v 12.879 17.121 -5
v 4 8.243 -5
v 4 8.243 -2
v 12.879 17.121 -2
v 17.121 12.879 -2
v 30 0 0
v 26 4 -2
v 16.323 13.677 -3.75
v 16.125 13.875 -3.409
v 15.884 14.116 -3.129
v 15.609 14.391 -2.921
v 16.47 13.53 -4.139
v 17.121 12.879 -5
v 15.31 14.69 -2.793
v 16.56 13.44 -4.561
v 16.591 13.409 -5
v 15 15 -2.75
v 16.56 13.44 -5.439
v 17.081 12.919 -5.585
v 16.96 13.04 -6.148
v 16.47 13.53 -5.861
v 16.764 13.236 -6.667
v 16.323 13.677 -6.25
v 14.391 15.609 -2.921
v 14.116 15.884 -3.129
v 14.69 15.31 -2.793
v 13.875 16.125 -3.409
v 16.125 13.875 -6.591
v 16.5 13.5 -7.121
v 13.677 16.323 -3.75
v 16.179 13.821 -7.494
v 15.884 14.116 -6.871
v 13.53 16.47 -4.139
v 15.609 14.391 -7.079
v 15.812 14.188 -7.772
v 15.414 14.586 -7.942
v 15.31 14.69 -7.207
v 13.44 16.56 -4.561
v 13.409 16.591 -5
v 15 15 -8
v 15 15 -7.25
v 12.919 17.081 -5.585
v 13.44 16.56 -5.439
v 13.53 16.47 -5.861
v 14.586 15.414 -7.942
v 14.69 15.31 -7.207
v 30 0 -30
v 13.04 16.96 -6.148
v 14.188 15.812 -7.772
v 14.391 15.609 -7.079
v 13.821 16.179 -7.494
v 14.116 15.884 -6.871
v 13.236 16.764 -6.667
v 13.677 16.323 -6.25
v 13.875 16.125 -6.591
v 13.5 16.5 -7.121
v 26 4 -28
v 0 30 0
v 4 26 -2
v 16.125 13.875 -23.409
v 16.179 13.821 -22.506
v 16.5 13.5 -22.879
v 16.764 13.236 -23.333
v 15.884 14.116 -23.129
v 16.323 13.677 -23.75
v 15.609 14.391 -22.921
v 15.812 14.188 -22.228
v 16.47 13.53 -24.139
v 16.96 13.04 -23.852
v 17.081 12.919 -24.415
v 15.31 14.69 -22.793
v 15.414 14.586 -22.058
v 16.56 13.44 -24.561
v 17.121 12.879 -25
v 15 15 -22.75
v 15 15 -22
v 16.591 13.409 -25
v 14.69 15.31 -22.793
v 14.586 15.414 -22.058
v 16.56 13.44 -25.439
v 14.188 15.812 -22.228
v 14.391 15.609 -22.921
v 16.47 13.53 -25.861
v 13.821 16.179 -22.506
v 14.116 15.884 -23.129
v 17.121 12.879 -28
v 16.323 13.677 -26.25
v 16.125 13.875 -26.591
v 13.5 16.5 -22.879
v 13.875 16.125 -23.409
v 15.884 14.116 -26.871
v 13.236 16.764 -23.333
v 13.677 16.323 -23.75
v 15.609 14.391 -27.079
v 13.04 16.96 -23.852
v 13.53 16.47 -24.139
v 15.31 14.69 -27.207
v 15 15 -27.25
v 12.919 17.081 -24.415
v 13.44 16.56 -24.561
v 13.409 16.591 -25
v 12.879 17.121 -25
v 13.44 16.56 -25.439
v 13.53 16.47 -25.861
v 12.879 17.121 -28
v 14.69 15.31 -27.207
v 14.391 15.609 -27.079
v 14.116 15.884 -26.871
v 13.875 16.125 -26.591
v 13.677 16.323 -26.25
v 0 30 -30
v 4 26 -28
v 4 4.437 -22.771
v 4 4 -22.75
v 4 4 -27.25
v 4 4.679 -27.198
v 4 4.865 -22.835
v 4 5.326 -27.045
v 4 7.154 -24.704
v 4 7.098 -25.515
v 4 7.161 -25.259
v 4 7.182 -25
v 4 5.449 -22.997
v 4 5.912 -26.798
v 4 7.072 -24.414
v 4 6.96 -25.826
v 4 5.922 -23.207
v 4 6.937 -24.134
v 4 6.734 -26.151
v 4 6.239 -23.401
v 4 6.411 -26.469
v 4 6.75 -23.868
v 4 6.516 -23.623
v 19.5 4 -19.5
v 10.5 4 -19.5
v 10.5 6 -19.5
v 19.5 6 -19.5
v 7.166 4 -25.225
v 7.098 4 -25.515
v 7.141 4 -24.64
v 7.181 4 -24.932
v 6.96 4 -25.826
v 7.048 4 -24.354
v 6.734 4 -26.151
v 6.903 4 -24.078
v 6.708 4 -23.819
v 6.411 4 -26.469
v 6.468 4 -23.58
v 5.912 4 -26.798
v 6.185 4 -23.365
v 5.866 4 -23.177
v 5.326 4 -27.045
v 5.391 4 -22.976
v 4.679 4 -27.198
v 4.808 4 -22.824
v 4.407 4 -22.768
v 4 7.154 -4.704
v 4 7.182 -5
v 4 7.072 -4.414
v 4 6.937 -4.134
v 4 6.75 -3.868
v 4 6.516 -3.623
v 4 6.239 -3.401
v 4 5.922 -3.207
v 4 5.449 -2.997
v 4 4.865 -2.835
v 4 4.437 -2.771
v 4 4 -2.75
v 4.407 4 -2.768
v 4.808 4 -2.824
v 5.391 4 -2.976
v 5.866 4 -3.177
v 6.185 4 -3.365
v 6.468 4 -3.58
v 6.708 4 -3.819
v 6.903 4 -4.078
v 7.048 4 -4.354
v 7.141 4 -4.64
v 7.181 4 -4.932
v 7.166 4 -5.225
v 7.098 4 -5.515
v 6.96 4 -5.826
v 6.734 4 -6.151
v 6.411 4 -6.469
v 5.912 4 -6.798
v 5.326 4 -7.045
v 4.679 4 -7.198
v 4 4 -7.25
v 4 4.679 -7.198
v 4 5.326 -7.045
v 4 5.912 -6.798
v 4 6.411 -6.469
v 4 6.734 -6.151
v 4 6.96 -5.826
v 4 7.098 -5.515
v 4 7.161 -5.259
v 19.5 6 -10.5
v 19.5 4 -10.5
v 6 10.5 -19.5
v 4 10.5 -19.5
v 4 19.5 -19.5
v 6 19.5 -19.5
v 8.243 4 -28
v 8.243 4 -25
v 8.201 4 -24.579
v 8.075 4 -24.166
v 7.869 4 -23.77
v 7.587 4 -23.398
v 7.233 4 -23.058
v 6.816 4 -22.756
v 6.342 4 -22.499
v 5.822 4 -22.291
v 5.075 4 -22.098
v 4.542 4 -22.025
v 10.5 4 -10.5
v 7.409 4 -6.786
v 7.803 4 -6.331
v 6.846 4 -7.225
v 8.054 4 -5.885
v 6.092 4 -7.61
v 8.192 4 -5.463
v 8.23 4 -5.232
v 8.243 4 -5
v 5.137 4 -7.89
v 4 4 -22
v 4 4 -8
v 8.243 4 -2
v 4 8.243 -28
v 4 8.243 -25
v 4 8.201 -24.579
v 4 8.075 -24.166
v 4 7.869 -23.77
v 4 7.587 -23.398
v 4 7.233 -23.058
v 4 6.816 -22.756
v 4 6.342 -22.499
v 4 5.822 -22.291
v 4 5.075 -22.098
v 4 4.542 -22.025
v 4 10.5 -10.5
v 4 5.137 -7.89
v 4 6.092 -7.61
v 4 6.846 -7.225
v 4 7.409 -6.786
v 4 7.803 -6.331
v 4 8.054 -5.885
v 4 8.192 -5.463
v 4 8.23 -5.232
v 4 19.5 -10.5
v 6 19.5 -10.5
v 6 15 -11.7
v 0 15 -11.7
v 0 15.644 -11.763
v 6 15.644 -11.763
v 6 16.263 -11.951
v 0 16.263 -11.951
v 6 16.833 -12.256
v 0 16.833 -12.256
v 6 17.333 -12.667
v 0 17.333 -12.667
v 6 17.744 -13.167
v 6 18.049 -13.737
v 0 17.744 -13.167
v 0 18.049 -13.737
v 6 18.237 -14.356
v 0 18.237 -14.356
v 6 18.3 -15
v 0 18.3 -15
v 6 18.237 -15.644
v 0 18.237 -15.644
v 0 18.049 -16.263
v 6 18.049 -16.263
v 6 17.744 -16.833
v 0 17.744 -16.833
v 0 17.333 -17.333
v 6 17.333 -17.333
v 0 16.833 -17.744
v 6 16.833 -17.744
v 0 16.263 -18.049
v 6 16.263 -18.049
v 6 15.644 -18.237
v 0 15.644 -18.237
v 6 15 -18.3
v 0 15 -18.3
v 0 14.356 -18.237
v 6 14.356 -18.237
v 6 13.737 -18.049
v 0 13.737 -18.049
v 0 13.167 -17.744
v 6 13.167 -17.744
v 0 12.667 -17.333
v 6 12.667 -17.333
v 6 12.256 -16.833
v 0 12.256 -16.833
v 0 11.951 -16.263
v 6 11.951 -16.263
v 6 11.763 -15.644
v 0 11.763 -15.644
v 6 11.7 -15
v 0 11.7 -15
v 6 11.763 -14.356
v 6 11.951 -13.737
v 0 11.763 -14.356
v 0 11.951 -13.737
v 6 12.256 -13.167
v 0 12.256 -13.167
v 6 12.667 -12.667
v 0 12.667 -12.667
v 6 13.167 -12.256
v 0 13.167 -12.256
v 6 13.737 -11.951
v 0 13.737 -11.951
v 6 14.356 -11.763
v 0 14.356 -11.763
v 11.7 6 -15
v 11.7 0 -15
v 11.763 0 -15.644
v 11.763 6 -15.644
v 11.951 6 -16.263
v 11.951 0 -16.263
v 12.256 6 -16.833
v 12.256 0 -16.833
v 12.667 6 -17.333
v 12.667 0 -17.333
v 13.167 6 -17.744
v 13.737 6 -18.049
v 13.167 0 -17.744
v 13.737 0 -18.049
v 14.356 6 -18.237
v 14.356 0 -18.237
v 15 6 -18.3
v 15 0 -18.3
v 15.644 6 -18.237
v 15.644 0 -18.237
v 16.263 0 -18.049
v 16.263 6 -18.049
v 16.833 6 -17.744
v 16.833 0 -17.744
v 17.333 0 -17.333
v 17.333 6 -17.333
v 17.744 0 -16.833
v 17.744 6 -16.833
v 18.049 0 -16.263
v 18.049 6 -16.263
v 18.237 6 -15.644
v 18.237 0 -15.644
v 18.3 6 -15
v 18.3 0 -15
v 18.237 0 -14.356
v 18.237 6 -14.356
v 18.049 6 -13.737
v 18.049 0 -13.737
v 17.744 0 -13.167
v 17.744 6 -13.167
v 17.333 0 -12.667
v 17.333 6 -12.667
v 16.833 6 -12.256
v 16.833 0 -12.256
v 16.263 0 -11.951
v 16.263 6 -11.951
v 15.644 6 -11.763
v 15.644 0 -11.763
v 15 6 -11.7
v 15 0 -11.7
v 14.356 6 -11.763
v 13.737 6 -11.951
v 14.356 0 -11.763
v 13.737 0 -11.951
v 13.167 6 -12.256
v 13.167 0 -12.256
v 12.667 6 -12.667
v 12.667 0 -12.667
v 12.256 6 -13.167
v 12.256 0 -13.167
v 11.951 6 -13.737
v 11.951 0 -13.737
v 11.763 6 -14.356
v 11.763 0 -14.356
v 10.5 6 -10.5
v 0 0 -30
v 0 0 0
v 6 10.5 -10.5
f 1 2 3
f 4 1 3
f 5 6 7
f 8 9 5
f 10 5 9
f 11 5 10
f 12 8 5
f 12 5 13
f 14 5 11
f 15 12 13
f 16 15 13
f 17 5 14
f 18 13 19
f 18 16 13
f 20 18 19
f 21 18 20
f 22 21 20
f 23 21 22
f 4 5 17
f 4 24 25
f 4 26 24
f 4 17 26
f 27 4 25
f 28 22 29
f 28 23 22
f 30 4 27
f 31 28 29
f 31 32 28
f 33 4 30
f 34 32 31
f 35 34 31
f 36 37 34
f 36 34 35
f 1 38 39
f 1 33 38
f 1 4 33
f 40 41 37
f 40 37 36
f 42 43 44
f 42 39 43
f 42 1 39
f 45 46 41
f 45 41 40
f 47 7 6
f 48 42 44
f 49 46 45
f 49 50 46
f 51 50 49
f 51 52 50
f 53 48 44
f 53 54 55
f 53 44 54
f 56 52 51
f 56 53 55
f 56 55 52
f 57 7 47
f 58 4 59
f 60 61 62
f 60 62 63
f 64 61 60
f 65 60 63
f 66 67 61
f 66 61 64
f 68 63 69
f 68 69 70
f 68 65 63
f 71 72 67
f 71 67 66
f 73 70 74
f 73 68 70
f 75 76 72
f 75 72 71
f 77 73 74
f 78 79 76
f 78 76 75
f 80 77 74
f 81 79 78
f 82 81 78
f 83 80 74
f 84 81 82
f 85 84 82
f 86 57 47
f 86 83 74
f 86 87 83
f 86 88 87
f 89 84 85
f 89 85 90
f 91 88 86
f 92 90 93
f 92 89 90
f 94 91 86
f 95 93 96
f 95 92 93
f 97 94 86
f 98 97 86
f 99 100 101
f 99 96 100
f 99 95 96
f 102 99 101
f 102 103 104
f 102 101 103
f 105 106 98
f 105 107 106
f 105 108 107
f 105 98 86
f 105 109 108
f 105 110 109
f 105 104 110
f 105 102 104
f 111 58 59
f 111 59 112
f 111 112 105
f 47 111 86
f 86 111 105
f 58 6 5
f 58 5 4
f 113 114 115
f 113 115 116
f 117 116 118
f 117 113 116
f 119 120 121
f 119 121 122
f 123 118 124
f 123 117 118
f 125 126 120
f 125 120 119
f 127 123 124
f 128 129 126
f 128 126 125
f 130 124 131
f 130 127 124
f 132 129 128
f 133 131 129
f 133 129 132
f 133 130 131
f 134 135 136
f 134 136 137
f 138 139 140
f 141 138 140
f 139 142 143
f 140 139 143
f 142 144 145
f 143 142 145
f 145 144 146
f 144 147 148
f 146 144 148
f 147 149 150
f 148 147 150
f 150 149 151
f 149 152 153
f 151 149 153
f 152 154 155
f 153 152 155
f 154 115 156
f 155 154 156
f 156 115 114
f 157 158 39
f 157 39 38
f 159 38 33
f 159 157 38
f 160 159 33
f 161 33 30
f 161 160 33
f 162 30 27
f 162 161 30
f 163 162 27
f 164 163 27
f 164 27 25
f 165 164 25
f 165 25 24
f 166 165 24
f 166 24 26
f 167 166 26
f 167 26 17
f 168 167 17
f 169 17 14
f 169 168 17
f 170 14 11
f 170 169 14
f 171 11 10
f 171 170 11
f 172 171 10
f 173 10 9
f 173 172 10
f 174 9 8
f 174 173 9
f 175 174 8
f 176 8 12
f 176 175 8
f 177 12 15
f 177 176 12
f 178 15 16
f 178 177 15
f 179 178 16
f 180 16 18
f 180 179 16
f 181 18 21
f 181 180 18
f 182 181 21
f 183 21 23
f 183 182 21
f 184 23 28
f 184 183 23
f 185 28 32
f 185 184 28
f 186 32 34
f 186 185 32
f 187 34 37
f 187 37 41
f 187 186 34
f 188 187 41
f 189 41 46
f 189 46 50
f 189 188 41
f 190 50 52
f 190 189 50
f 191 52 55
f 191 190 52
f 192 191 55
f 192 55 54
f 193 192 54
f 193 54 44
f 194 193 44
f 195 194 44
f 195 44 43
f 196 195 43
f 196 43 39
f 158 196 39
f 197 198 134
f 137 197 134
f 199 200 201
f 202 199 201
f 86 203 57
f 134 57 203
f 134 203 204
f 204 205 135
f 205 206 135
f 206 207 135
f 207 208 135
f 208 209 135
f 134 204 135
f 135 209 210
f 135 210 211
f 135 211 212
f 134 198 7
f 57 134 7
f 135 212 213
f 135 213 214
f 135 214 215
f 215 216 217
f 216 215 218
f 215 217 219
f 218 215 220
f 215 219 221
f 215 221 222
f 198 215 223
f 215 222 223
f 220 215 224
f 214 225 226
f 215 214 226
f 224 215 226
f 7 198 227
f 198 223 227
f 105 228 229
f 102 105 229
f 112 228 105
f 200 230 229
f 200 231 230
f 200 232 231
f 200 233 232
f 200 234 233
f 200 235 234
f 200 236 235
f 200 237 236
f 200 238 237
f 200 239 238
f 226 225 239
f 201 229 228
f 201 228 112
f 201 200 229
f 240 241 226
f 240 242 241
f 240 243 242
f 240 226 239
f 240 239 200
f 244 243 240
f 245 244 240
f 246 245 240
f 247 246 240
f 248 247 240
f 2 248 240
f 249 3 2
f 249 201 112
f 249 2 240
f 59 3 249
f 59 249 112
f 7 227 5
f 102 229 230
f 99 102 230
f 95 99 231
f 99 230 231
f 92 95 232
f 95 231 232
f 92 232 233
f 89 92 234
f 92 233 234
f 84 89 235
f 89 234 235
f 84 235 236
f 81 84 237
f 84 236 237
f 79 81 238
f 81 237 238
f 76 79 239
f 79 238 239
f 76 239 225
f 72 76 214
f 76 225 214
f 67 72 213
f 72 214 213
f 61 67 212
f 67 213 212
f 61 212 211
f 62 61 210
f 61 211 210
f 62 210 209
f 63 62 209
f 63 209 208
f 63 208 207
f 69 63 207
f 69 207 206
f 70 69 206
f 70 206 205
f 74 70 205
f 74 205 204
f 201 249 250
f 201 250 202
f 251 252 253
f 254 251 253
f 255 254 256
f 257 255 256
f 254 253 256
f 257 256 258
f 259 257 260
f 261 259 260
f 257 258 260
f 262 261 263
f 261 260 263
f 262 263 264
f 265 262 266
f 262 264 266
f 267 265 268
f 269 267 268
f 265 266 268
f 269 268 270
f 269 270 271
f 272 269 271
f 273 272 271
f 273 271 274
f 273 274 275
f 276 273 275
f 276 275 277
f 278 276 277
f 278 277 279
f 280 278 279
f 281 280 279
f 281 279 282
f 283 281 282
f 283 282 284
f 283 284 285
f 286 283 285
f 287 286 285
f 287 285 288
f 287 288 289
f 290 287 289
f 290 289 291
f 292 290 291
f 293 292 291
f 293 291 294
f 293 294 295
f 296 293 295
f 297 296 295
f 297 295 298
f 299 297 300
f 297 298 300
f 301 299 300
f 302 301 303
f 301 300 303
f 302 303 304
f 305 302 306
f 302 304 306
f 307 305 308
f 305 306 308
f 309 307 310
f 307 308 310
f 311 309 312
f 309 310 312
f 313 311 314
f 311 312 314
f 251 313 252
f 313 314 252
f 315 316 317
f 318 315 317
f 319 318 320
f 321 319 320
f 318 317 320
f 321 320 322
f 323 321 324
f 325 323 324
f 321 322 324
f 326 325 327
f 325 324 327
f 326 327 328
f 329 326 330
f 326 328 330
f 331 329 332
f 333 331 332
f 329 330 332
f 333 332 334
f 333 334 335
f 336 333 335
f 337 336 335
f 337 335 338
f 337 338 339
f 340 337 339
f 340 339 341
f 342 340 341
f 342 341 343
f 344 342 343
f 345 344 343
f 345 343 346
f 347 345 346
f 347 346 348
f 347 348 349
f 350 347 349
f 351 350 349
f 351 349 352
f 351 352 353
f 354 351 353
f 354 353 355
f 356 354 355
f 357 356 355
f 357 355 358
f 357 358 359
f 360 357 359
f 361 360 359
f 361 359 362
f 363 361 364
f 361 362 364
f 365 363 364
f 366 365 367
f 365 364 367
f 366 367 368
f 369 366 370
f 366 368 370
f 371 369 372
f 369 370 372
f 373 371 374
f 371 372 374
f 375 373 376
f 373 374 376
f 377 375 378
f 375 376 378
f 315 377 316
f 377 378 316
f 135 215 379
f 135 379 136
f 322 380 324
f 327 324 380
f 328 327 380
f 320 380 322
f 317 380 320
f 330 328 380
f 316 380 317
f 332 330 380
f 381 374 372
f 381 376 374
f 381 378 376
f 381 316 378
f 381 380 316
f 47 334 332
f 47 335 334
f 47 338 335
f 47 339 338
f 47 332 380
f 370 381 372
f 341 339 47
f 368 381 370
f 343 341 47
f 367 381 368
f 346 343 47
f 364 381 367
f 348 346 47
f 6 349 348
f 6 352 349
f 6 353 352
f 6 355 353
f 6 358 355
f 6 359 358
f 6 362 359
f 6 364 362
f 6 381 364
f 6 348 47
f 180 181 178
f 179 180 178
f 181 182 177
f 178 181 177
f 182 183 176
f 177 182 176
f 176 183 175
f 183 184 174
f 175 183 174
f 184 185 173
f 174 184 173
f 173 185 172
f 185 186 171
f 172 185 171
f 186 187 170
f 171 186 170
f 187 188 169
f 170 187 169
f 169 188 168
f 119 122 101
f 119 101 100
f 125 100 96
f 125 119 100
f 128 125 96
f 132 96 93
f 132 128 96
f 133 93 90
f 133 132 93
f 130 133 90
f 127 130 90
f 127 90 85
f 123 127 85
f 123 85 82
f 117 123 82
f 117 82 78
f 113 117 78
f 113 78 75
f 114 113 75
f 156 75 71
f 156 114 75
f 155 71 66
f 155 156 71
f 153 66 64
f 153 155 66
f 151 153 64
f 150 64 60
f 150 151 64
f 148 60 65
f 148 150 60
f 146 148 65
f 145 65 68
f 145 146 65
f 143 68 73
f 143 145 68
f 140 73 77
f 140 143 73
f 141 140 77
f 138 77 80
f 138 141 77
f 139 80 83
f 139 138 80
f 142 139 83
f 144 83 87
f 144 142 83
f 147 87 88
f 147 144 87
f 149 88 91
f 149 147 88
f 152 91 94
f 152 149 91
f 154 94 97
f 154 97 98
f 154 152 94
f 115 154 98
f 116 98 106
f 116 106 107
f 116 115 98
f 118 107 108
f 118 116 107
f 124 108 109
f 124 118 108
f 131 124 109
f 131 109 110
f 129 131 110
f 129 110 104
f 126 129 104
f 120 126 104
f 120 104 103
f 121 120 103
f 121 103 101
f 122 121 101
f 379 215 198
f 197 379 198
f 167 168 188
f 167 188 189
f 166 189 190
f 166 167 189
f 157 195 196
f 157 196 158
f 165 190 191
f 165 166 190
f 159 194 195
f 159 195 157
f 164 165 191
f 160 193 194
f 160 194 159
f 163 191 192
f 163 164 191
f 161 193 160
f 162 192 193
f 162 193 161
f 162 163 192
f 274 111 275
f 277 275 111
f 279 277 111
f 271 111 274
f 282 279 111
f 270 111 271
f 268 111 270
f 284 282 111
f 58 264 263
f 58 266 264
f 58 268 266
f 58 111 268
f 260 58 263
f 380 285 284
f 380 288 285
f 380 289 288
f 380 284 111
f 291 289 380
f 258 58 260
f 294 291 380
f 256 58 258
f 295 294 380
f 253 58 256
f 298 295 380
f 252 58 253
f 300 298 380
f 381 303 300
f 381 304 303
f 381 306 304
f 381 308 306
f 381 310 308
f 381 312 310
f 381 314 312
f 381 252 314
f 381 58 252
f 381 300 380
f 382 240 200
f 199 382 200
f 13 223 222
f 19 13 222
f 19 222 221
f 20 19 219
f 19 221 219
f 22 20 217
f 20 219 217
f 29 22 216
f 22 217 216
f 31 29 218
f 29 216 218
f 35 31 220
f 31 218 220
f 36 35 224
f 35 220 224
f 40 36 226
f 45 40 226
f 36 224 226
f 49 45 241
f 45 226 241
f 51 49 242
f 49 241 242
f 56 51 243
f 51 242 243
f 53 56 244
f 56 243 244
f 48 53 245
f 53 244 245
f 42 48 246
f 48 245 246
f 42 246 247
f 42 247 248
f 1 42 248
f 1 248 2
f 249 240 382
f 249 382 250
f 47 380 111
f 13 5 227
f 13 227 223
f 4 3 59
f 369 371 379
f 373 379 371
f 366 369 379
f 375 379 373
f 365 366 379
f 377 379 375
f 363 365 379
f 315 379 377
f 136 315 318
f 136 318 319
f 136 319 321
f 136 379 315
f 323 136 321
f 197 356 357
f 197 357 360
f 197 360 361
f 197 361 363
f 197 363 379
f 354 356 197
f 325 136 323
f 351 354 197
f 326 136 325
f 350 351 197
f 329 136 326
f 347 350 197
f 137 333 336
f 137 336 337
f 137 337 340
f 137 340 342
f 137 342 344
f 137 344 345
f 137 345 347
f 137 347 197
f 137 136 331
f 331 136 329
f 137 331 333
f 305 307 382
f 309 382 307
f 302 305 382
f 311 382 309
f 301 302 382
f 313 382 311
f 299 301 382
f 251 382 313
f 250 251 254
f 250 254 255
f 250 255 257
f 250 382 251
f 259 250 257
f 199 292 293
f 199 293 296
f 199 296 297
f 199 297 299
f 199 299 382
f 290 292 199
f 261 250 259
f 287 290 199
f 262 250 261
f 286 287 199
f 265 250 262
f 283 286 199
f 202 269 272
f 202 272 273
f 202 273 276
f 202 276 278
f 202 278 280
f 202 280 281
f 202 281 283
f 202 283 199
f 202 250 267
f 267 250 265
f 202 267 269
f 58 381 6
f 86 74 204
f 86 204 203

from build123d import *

# Parameters (mm, degrees)
BOSS_EXTRUDE1_DEPTH  = 30
SHELL1_START         = 4
SHELL1_OUTLINE_W     = 23
SHELL1_OUTLINE_H     = 26
SHELL1_DEPTH         = 22
SKETCH2_W            = 9
SKETCH2_H            = 9
BOSS_EXTRUDE2_DEPTH  = 2
SKETCH3_W            = 9
SKETCH3_H            = 9
BOSS_EXTRUDE3_DEPTH  = 2
BOSS_EXTRUDE4_START  = -15.556349
SKETCH4_R            = 2.25
BOSS_EXTRUDE4_DEPTH  = 15.556349
M6_CLEARANCE_HOLE2_D = 6.6
M6_CLEARANCE_HOLE3_D = 6.6


# Read off the part's stored shape, not the designer's step: Shell1
with BuildPart() as part:
    # Sketch1 → Boss-Extrude1 (new body)
    with BuildSketch(Plane.XY):
        Polygon((0, 0), (30, 0), (0, 30), align=None)
    extrude(amount=-BOSS_EXTRUDE1_DEPTH)

    # Shell1 outline → Shell1 (cut)
    with BuildSketch(Plane.YZ.offset(SHELL1_START)):
        with Locations((15.5, -15)):
            Rectangle(SHELL1_OUTLINE_W, SHELL1_OUTLINE_H)
    extrude(amount=SHELL1_DEPTH, mode=Mode.SUBTRACT)

    # Sketch2 → Boss-Extrude2 (add)
    with BuildSketch(Plane(origin=(0, 4, 0), x_dir=(1, 0, 0), z_dir=(0, 1, 0))):
        with Locations((15, 15)):
            Rectangle(SKETCH2_W, SKETCH2_H)
    extrude(amount=BOSS_EXTRUDE2_DEPTH)

    # Sketch3 → Boss-Extrude3 (add)
    with BuildSketch(Plane(origin=(4, 0, 0), x_dir=(0, 0, -1), z_dir=(1, 0, 0))):
        with Locations((15, 15)):
            Rectangle(SKETCH3_W, SKETCH3_H)
    extrude(amount=BOSS_EXTRUDE3_DEPTH)

    # Sketch4 → Boss-Extrude4 (add)
    # profile 1 of 2: a face of its own
    with BuildSketch(Plane(origin=(15, 15, 0), x_dir=(0, 0, -1), z_dir=(0.7071067811865477, 0.7071067811865475, 0)).offset(BOSS_EXTRUDE4_START)):
        with BuildLine():
            Line((2, 3), (2, -3))
            Line((2, -3), (5, -3))
            ThreePointArc((5, -3), (8, 0), (5, 3))
            Line((5, 3), (2, 3))
        make_face()
        with Locations(Location((5, 0, 0), (0, 0, 90))):
            Circle(SKETCH4_R, mode=Mode.SUBTRACT)
    # profile 2 of 2: a face of its own
    with BuildSketch(Plane(origin=(15, 15, 0), x_dir=(0, 0, -1), z_dir=(0.7071067811865477, 0.7071067811865475, 0)).offset(BOSS_EXTRUDE4_START)):
        with BuildLine():
            Line((25, -3), (28, -3))
            Line((28, -3), (28, 3))
            Line((28, 3), (25, 3))
            ThreePointArc((25, 3), (22, 0), (25, -3))
        make_face()
        with Locations(Location((25, 0, 0), (0, 0, 90))):
            Circle(SKETCH4_R, mode=Mode.SUBTRACT)
    extrude(amount=BOSS_EXTRUDE4_DEPTH)

    # M6 Clearance Hole2 (through all)
    with Locations(Plane(origin=(0, 6, 0), x_dir=(1, 0, 0), z_dir=(0, 1, 0))):
        with Locations((15, 15)):
            Hole(M6_CLEARANCE_HOLE2_D / 2)

    # M6 Clearance Hole3 (through all)
    with Locations(Plane(origin=(6, 0, 0), x_dir=(0, 0, -1), z_dir=(1, 0, 0))):
        with Locations((15, 15)):
            Hole(M6_CLEARANCE_HOLE3_D / 2)


solid = part.part
